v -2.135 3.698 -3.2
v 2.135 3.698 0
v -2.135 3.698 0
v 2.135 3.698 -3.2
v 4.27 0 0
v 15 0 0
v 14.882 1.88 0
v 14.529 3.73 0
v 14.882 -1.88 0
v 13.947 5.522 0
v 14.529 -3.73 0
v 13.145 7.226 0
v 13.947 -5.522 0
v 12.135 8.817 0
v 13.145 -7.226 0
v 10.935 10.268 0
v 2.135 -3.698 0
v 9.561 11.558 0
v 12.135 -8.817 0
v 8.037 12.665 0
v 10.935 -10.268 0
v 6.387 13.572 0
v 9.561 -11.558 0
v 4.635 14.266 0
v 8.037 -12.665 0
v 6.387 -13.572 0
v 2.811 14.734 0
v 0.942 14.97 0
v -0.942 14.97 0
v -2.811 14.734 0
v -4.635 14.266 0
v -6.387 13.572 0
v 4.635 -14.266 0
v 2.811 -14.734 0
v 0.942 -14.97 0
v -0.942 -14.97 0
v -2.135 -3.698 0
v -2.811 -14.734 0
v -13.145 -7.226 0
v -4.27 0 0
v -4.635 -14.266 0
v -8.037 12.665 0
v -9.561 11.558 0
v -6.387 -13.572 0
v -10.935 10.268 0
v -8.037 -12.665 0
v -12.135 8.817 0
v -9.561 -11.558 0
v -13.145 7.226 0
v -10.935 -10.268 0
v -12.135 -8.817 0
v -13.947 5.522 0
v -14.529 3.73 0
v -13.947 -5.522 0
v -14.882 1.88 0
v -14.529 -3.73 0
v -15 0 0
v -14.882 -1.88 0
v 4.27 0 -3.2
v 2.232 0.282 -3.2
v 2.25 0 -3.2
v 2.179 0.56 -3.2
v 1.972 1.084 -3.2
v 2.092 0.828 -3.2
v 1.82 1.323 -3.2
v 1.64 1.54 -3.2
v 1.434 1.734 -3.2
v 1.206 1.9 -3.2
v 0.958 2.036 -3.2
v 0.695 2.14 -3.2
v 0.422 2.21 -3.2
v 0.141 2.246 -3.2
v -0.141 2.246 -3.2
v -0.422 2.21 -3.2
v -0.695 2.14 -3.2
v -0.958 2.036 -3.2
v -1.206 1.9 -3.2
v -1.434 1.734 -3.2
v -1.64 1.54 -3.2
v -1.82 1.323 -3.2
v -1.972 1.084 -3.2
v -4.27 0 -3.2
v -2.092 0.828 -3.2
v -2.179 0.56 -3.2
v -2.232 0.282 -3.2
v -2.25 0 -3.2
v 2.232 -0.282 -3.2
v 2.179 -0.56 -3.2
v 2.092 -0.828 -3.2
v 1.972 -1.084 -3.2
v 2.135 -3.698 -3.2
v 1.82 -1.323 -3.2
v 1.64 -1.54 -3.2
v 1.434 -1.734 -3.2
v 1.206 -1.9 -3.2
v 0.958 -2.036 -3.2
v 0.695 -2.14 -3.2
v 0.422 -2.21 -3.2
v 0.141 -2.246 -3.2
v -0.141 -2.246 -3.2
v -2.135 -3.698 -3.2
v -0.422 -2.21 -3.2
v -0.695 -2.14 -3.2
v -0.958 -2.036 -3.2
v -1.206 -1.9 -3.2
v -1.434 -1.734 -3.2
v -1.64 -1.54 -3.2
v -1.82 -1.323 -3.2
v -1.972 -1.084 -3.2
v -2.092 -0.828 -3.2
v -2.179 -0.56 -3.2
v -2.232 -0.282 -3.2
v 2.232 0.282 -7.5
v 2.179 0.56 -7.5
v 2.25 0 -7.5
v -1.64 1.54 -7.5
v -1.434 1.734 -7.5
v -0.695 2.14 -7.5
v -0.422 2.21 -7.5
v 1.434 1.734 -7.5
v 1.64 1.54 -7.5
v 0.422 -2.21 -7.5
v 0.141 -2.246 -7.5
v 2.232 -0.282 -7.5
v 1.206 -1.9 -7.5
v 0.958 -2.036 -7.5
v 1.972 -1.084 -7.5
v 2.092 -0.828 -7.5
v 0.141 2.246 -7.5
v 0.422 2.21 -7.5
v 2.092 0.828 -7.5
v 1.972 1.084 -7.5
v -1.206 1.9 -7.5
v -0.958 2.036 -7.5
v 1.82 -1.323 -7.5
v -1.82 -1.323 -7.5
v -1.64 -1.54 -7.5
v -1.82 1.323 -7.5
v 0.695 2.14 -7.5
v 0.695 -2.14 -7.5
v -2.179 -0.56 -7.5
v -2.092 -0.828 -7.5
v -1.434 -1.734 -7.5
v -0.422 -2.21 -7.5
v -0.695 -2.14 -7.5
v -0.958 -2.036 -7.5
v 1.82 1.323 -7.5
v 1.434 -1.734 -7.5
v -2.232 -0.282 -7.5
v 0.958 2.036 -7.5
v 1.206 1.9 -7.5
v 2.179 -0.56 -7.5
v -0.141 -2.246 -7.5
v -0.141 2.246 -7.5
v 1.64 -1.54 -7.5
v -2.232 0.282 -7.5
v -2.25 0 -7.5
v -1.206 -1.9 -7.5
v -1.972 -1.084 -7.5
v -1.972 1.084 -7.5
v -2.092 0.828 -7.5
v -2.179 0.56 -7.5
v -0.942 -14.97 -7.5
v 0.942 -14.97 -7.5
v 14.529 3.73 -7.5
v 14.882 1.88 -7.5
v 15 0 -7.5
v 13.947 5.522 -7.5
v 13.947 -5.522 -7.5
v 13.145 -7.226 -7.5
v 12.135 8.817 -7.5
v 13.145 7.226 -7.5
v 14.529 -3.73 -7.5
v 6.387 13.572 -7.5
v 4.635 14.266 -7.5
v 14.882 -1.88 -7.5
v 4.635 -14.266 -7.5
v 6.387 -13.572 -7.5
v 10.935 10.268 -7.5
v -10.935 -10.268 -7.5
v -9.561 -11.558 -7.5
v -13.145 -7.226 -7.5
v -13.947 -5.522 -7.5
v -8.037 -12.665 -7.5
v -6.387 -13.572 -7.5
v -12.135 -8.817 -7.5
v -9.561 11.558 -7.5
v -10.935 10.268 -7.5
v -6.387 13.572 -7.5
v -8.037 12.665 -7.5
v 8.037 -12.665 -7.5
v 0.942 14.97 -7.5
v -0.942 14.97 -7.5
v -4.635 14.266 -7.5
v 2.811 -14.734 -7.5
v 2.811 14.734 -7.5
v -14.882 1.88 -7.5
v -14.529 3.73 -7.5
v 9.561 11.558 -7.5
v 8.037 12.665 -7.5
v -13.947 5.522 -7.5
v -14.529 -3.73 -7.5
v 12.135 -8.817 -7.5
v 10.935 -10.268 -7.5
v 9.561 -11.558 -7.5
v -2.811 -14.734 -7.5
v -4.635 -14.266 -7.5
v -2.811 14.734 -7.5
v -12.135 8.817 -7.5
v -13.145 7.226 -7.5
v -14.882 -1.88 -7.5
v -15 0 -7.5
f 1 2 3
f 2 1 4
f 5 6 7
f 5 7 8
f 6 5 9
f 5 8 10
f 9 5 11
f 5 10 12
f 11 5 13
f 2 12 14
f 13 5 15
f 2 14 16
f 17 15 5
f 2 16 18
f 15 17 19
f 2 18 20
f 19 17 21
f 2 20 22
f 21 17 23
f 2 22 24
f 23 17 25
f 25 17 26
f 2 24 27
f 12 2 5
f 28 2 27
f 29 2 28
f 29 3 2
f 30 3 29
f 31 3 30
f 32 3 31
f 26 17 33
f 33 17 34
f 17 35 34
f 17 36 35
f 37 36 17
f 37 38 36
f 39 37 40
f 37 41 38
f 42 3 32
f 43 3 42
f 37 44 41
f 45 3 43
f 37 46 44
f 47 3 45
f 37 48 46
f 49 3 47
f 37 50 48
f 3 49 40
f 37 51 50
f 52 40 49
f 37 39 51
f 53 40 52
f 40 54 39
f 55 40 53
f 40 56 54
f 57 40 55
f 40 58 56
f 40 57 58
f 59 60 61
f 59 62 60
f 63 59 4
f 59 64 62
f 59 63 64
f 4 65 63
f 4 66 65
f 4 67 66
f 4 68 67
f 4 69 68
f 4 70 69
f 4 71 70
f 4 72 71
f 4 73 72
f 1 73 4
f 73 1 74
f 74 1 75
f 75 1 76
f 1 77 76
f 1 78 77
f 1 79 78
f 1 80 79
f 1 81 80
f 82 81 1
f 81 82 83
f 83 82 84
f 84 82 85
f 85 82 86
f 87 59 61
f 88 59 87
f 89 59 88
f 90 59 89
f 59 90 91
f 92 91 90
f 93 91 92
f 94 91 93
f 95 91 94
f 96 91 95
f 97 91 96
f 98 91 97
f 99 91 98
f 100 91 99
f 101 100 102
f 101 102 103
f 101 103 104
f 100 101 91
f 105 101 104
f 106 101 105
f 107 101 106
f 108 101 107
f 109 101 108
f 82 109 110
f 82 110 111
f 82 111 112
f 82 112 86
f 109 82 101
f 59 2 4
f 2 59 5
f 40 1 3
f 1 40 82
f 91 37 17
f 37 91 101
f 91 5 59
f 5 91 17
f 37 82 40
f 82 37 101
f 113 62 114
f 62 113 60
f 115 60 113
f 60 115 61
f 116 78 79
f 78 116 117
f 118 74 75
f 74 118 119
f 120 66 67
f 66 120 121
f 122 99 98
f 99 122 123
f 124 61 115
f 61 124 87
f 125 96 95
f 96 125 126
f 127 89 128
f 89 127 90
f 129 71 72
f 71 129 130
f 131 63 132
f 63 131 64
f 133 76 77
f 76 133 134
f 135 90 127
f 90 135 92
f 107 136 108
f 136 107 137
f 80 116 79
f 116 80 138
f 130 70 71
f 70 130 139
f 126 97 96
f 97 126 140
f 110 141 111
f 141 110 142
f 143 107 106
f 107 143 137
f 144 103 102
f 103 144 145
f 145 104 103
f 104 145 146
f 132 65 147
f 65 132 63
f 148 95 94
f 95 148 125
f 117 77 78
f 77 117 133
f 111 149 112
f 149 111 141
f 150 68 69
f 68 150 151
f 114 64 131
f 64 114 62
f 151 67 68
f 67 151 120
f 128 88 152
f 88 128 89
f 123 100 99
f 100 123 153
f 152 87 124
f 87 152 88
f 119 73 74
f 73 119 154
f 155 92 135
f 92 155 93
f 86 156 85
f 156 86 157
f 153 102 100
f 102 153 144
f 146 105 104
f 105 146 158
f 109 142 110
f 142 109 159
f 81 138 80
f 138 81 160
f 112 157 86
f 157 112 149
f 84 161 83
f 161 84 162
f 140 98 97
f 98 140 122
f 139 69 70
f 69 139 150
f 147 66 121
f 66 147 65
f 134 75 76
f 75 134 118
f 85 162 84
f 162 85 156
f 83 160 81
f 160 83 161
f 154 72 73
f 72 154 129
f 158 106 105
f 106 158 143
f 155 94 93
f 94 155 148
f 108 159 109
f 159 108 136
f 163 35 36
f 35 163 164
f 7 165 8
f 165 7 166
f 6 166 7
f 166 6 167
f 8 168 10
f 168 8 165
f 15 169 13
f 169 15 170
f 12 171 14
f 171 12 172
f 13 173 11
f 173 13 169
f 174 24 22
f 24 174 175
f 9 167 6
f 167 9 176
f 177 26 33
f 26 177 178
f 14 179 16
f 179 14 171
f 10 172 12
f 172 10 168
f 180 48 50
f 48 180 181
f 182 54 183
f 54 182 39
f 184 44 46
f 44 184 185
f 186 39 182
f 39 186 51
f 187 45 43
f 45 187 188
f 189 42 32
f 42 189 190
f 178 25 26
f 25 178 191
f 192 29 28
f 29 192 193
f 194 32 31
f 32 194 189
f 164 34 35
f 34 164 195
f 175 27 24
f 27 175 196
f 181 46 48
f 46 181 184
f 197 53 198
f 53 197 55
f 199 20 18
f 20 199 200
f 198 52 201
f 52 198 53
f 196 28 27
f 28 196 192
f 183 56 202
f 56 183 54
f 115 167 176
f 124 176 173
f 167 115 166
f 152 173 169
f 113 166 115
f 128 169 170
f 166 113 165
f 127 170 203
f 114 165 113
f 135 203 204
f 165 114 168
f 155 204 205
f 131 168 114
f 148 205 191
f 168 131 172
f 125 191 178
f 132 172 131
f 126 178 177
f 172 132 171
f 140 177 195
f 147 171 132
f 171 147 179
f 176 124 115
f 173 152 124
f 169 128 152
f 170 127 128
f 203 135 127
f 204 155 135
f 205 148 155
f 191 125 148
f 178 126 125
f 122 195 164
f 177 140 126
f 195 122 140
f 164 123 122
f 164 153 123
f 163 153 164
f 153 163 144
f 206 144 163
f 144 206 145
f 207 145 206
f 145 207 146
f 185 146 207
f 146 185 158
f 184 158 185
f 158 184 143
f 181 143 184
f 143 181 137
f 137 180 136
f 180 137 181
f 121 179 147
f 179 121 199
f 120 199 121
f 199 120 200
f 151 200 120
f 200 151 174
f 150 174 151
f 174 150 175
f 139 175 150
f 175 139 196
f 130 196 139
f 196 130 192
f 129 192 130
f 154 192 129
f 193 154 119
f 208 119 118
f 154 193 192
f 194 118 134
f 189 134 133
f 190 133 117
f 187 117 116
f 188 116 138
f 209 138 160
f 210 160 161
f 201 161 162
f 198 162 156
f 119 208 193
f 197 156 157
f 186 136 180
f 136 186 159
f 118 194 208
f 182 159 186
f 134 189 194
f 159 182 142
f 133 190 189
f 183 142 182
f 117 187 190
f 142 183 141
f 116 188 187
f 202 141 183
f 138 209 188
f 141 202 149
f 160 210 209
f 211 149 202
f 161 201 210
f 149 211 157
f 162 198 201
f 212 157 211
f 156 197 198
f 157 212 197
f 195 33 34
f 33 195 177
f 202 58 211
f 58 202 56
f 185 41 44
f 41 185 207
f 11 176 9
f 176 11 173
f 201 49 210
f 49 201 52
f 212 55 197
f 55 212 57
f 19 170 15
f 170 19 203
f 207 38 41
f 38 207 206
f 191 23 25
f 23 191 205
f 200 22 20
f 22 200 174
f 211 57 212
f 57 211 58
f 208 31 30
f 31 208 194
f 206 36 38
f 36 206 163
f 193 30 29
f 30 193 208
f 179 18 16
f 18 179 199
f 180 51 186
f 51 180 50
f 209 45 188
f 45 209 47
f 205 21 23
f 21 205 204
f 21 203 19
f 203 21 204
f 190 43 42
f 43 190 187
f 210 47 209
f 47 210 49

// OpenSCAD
$fn = 50;


difference() {
	union() {
		translate(v = [0, 0, -7.5000000000]) {
			cylinder(h = 7.5000000000, r = 15.0000000000);
		}
	}
	union() {
		translate(v = [0, 0, 0]) {
			rotate(a = [0, 0, 0]) {
				difference() {
					union() {
						translate(v = [0, 0, -3.2000000000]) {
							linear_extrude(height = 3.2000000000) {
								polygon(points = [[4.2698000000, 0.0000000000], [2.1349000000, 3.6977552691], [-2.1349000000, 3.6977552691], [-4.2698000000, 0.0000000000], [-2.1349000000, -3.6977552691], [2.1349000000, -3.6977552691]]);
							}
						}
					}
					union();
				}
			}
		}
		#translate(v = [0, 0, -100.0000000000]) {
			cylinder(h = 200, r = 2.2500000000);
		}
	}
}
